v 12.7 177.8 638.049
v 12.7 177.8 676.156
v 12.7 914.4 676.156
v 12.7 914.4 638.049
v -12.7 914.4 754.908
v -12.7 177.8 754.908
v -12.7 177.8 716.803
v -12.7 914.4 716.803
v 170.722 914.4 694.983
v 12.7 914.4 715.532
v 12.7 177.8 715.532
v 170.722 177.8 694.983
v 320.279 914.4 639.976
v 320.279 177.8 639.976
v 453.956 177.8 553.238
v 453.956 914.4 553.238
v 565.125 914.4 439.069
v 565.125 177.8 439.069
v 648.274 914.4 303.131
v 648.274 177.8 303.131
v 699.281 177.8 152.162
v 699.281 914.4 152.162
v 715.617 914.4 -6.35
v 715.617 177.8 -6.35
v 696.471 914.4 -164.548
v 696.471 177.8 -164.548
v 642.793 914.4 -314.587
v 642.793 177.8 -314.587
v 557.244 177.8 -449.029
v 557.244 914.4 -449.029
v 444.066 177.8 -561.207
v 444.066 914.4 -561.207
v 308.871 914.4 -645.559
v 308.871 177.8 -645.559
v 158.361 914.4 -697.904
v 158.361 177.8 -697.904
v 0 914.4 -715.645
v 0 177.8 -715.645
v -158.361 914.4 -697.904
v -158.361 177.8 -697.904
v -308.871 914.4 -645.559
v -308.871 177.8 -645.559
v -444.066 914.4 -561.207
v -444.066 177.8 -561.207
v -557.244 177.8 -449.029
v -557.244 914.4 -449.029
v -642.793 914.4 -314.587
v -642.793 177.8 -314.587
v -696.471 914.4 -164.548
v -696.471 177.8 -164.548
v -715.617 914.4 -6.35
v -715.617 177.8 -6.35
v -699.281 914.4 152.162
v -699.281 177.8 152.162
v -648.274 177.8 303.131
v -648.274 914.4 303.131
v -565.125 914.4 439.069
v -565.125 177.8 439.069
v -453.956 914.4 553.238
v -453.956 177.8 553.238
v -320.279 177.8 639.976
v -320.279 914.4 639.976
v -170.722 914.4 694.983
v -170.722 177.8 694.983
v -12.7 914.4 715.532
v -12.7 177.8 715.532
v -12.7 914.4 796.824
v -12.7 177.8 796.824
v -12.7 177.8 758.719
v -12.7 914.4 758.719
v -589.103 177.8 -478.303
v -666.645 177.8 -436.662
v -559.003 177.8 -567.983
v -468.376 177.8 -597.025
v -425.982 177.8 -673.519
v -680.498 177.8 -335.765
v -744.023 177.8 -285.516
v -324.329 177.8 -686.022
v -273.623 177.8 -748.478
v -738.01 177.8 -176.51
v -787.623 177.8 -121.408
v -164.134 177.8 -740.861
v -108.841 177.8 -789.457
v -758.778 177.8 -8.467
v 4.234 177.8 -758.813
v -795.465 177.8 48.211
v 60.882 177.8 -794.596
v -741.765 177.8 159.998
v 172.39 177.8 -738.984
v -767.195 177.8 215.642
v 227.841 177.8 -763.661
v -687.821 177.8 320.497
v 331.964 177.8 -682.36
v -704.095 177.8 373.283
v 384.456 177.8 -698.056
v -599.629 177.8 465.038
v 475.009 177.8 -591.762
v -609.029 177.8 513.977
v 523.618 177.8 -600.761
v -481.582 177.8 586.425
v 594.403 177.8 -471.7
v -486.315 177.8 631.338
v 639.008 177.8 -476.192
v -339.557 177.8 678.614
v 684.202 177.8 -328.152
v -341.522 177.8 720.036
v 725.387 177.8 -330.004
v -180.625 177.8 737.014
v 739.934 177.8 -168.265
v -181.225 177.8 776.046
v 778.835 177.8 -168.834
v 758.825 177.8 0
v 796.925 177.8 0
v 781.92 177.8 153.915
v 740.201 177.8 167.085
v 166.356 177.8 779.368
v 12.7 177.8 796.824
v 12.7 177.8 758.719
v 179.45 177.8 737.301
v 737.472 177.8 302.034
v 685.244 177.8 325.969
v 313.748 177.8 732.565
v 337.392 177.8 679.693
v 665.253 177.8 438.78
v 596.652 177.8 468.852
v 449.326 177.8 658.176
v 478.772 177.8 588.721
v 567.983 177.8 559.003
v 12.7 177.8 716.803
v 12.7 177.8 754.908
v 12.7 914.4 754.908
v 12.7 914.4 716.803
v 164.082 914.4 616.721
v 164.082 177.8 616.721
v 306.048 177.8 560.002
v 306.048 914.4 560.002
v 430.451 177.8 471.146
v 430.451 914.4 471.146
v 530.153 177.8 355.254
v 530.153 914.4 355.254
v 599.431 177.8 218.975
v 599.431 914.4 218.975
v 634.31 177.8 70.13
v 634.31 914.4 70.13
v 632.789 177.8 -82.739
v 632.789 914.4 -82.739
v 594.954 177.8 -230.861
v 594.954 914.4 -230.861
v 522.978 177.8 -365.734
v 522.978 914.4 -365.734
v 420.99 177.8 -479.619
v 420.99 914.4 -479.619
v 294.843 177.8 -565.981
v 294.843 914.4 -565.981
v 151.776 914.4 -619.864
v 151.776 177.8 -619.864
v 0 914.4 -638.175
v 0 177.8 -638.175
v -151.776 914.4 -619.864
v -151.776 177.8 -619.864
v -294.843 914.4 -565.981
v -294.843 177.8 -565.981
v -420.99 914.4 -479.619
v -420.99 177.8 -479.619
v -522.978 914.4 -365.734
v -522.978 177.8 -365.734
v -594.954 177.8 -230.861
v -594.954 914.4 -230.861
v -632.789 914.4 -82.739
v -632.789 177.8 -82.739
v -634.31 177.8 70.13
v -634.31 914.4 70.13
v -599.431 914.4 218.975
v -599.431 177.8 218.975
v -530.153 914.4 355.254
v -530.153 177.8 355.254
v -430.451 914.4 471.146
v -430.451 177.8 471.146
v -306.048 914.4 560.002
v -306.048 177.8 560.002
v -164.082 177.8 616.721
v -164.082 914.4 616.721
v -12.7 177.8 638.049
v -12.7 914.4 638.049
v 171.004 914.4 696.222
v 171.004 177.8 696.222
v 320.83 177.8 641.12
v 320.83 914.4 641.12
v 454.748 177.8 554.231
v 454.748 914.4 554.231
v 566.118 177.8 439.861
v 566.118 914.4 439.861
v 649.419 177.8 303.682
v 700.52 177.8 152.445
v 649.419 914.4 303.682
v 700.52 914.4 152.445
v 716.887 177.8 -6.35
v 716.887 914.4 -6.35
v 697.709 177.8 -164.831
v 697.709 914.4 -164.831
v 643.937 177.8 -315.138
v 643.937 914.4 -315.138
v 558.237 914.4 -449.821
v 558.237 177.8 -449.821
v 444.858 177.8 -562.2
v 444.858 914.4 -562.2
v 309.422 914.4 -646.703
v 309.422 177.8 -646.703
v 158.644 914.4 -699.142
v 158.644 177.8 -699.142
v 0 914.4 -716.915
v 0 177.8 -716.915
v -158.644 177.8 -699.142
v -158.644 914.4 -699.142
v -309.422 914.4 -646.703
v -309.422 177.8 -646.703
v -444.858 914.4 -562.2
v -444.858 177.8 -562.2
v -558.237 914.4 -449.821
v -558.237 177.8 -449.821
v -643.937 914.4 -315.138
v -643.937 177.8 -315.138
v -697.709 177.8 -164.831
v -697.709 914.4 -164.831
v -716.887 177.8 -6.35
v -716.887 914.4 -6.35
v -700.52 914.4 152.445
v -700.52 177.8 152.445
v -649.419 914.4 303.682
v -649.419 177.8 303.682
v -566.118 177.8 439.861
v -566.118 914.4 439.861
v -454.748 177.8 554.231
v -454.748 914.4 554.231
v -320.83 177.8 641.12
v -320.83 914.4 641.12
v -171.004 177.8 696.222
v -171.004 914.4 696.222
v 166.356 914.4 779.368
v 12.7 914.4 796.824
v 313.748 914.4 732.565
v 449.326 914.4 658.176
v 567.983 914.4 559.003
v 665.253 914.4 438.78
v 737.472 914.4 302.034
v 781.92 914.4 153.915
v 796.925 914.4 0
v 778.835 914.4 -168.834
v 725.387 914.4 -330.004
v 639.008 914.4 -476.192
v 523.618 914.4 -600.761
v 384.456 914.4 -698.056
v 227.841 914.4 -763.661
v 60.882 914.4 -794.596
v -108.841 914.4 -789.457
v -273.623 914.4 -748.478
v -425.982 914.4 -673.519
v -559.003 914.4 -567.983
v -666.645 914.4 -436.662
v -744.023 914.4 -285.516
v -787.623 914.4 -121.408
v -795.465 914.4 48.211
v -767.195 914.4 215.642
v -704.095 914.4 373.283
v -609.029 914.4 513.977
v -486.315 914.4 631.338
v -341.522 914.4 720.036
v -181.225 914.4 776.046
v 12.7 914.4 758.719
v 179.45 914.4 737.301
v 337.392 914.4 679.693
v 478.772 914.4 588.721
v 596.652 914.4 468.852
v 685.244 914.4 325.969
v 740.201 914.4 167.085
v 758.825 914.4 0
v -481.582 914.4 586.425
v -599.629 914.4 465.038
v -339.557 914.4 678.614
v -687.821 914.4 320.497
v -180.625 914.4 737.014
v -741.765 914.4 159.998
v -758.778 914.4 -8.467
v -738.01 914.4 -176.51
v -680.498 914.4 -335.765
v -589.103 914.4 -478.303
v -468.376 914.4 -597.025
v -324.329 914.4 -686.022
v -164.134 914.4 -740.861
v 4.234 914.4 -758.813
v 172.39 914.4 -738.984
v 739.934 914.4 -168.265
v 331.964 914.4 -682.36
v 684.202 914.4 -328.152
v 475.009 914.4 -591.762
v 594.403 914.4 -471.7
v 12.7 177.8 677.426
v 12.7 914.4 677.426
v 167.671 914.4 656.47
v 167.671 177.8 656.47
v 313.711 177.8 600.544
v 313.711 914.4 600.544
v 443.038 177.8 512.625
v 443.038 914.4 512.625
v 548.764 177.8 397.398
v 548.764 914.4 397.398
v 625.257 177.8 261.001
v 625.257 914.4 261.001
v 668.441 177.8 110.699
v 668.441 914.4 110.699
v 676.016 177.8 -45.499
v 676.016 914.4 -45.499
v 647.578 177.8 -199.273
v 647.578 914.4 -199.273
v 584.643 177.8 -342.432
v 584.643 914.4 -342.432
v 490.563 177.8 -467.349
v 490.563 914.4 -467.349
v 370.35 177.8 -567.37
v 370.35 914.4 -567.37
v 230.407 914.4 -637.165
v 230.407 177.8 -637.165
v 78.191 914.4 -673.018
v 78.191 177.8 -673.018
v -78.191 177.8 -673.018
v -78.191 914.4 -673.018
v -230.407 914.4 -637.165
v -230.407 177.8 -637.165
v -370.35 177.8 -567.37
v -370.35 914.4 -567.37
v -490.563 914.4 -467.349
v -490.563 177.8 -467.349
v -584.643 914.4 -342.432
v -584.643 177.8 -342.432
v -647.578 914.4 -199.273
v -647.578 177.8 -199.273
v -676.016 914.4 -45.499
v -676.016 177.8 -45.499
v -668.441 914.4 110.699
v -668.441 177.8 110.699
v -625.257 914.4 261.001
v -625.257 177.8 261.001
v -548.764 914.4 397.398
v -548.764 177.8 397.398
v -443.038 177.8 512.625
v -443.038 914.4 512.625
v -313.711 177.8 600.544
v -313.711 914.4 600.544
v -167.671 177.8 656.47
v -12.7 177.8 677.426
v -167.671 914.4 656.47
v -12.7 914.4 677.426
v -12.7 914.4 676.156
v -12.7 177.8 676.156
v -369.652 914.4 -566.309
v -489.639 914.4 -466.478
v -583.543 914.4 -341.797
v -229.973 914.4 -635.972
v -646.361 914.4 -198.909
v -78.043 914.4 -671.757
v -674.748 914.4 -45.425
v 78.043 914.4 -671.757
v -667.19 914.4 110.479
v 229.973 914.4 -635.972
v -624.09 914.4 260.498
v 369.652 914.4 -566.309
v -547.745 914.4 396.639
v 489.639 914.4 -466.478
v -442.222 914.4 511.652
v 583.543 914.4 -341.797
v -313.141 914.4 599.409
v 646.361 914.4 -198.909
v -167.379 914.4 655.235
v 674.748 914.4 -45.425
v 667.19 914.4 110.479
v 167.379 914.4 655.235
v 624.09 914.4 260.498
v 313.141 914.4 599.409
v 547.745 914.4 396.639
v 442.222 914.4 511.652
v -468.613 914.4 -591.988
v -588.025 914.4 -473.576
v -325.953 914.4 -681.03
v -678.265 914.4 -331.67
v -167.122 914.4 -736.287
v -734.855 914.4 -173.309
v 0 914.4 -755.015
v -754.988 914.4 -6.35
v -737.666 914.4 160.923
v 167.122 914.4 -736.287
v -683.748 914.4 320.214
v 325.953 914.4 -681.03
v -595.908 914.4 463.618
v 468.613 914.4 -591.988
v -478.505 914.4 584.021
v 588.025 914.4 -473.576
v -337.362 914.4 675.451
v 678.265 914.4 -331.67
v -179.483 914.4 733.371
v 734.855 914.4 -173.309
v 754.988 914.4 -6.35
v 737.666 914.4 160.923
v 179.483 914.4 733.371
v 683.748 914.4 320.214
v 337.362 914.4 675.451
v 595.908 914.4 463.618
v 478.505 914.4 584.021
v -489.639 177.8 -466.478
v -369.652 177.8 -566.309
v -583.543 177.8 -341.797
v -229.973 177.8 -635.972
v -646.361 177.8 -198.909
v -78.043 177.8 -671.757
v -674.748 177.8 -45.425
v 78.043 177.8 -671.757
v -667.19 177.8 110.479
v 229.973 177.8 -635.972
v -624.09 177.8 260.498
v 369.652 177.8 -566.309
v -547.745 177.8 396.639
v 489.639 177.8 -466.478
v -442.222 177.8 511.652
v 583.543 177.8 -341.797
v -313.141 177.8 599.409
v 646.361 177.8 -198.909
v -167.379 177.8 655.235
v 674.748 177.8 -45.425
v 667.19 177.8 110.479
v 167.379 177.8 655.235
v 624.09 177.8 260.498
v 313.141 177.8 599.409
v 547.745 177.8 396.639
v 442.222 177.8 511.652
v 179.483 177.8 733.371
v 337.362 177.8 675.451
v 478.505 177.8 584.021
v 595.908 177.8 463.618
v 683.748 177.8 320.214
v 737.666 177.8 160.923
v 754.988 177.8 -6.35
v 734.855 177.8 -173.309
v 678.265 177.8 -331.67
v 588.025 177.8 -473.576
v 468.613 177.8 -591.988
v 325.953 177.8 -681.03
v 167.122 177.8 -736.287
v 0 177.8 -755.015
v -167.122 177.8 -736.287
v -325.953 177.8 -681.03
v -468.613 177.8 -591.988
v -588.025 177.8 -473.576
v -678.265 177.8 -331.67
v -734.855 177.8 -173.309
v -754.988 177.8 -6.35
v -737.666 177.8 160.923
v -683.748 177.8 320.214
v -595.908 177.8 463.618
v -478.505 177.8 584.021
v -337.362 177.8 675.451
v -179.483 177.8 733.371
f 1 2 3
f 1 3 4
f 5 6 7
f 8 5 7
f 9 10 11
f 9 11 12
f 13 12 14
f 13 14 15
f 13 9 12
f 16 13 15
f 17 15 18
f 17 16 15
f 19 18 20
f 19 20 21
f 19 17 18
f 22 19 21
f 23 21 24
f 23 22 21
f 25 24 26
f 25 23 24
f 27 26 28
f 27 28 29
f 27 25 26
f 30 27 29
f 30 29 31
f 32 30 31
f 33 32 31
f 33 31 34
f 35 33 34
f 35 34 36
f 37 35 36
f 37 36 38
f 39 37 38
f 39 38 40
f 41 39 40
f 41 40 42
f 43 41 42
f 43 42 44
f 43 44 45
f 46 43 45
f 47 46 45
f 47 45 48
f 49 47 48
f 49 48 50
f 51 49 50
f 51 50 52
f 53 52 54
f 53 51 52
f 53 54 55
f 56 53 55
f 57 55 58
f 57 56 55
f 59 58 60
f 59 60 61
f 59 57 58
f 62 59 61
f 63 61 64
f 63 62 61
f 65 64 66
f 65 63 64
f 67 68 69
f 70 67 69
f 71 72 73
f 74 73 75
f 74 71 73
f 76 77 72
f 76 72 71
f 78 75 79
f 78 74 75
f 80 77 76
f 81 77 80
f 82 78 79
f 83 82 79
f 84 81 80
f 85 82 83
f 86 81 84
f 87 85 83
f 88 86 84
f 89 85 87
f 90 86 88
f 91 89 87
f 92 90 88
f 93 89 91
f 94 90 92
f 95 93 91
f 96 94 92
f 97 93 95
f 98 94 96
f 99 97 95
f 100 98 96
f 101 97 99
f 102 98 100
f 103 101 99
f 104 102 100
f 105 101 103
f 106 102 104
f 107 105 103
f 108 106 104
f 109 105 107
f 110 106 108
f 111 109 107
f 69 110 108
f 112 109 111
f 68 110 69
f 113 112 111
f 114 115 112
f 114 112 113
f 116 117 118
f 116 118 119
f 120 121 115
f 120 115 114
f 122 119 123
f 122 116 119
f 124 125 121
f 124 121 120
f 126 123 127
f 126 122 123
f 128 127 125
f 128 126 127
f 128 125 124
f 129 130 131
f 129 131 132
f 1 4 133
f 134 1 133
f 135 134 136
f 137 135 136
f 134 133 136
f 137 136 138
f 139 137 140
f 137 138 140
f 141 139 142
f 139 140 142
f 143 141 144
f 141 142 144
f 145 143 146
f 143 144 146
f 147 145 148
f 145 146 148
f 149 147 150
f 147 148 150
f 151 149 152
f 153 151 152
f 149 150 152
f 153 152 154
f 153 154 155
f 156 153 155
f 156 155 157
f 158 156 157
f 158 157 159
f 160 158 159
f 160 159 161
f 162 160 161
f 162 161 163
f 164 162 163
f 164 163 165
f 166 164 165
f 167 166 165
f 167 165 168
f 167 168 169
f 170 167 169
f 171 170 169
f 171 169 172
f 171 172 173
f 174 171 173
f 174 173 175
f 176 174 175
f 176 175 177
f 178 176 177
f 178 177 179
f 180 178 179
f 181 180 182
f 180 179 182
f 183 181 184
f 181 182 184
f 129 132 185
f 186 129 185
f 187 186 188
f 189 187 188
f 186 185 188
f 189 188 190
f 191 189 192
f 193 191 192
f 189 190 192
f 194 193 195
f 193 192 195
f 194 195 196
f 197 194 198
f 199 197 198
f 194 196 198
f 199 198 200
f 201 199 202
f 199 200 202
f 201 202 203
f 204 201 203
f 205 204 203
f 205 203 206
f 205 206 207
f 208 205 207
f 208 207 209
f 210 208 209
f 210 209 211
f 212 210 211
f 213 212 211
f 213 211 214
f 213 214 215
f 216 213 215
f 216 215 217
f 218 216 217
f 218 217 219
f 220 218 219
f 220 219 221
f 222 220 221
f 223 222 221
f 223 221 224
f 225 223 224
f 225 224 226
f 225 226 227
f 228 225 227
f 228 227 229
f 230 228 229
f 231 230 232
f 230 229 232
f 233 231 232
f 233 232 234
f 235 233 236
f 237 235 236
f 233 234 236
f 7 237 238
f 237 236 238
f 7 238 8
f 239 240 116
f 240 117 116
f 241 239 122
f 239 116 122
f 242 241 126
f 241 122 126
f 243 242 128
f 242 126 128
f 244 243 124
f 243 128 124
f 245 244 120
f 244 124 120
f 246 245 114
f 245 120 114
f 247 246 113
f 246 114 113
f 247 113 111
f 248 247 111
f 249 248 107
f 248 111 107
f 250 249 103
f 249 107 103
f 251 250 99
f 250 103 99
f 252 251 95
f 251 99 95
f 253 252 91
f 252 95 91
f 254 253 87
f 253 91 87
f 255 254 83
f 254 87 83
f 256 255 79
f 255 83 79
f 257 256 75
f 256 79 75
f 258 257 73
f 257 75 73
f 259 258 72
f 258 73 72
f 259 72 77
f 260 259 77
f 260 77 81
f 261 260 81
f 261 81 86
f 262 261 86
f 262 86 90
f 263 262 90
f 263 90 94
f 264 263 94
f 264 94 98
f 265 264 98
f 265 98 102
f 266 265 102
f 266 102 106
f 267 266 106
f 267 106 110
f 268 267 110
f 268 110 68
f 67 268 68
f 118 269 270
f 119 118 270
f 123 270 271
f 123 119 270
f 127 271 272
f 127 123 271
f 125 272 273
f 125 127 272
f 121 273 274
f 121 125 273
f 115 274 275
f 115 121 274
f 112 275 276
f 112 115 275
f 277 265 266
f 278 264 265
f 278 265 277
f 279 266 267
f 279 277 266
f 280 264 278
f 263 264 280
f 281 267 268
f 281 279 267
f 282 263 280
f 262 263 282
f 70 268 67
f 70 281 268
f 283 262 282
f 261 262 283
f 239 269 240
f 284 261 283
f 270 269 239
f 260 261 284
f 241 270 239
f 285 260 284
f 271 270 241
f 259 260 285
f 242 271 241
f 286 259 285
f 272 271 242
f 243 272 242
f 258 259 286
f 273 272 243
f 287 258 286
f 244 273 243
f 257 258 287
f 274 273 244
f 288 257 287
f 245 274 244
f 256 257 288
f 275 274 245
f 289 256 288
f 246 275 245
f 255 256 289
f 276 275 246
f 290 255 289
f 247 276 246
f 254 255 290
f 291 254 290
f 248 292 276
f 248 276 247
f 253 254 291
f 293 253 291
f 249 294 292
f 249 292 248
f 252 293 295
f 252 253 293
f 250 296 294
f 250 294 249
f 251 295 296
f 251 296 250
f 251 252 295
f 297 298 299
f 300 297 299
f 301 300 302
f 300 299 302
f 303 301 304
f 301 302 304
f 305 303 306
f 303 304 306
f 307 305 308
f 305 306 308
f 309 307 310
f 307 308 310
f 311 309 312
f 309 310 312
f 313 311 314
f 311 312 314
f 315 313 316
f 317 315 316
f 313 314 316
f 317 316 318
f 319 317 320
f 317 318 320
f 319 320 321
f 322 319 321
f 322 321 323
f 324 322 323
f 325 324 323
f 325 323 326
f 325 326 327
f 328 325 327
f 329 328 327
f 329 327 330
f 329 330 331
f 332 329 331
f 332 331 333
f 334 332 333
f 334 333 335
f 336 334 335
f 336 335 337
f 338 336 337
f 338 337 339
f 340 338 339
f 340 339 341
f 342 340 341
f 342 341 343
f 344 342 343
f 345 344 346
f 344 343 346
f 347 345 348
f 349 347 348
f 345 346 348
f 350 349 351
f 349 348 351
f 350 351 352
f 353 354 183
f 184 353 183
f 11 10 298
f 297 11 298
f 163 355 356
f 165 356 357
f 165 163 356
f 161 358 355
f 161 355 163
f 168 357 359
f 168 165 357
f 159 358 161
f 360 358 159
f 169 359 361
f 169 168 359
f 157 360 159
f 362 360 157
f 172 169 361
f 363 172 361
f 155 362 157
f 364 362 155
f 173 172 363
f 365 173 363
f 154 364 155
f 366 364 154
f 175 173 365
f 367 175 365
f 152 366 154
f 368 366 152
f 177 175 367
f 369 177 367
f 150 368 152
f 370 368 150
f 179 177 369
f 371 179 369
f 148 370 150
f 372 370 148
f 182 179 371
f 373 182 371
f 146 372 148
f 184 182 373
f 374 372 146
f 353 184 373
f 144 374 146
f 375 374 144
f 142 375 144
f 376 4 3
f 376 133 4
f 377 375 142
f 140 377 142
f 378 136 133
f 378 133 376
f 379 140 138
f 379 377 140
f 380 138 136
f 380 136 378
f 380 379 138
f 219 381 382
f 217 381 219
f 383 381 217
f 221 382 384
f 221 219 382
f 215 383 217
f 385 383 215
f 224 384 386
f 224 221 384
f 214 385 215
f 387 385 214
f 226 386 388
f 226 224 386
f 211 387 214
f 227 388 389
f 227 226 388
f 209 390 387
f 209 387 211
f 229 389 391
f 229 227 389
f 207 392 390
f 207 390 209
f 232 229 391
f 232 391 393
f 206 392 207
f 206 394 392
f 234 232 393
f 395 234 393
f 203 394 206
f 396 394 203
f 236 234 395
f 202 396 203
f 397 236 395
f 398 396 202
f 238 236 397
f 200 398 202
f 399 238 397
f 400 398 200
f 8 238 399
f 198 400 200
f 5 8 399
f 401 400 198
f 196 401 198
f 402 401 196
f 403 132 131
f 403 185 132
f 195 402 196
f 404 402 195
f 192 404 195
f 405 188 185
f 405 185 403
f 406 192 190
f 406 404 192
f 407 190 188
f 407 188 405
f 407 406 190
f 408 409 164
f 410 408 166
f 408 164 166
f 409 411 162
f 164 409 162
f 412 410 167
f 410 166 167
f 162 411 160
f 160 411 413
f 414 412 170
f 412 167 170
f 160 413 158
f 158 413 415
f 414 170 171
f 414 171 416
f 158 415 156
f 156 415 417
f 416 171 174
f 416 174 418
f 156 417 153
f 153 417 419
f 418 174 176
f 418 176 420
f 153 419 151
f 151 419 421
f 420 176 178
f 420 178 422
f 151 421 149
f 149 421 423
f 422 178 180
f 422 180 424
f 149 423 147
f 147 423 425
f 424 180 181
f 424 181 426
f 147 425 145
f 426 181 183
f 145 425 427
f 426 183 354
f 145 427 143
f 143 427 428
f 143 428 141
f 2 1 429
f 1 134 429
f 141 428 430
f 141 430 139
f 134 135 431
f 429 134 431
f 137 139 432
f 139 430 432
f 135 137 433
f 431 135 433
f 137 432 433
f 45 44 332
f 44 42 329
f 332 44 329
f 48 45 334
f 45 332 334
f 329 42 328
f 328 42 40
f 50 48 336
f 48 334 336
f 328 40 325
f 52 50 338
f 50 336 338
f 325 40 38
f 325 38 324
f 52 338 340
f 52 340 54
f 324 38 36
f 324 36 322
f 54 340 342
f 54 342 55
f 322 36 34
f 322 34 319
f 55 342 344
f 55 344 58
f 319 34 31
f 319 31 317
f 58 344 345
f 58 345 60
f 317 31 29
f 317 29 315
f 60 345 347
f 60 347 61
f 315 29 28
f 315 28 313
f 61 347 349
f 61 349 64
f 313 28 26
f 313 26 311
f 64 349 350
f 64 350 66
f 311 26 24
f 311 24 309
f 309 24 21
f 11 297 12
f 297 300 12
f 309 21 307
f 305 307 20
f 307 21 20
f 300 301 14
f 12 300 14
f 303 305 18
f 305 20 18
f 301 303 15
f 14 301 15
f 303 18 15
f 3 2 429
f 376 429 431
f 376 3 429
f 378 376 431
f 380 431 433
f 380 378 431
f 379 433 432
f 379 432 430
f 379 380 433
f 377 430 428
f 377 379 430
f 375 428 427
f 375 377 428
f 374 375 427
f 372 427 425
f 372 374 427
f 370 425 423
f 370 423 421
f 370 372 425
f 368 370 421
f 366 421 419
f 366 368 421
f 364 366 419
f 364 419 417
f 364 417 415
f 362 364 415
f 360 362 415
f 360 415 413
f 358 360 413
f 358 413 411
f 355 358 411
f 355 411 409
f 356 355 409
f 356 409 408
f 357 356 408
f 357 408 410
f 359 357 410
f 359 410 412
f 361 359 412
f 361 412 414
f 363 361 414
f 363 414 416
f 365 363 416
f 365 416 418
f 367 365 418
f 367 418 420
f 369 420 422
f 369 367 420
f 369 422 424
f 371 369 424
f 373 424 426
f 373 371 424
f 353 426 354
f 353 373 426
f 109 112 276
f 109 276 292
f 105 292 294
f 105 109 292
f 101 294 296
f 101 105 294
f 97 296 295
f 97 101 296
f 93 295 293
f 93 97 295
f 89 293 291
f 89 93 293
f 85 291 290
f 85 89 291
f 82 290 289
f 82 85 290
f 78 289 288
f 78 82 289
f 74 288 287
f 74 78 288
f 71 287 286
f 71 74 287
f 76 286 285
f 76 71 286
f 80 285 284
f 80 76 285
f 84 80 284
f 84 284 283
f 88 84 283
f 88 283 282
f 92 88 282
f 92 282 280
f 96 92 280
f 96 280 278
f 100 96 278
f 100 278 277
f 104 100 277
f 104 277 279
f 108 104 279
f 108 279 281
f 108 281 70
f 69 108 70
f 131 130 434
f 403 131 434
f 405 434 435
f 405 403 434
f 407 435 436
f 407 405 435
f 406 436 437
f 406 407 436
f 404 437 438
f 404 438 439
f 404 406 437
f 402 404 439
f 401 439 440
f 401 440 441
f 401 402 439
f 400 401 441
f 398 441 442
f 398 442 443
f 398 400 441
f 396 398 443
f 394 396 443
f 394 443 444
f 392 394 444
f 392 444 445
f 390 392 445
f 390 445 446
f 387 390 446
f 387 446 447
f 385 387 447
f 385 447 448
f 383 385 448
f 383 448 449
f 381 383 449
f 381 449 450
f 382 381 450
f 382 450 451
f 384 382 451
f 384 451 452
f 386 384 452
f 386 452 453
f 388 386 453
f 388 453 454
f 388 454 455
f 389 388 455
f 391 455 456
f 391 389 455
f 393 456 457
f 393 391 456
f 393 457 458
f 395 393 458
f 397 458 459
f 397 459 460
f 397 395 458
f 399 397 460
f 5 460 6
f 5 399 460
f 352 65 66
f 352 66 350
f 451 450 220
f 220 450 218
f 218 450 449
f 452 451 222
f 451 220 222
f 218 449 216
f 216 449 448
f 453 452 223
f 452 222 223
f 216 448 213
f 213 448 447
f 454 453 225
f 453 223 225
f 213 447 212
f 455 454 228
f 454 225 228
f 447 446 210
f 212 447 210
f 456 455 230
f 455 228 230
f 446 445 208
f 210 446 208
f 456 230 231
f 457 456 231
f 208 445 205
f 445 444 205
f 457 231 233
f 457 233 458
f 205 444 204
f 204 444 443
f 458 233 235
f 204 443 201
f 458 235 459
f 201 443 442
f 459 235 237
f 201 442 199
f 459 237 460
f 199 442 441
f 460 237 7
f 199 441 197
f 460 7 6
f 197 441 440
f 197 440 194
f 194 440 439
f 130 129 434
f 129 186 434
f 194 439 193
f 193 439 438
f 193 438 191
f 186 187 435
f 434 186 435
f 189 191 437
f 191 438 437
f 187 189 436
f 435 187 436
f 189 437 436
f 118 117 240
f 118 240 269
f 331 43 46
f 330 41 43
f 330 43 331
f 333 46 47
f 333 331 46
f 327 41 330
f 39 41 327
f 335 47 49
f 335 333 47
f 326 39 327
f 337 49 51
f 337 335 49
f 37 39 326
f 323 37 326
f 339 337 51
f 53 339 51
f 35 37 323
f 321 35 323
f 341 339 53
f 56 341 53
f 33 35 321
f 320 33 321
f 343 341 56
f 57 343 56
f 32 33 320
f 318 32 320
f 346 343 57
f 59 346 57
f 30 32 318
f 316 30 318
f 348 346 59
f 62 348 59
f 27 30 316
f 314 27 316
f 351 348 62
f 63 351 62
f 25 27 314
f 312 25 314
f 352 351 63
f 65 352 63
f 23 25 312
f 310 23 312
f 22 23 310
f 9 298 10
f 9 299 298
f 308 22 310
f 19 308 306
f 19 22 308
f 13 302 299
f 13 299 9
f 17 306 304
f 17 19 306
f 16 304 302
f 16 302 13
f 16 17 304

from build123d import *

# Parameters (mm, degrees)
BOSS_EXTRUDE1_OUTLINE_R   = 796.925
BOSS_EXTRUDE1_OUTLINE_R_2 = 758.825
BOSS_EXTRUDE1_DEPTH       = 914.4
SKETCH3_R                 = 676.275
SKETCH3_R_2               = 638.175
BOSS_EXTRUDE2_DEPTH       = 736.6
SKETCH3_R_3               = 715.645
SKETCH3_R_4               = 677.545
BOSS_EXTRUDE2_2_DEPTH     = 736.6
SKETCH3_R_5               = 755.015
SKETCH3_R_6               = 716.915
BOSS_EXTRUDE2_3_DEPTH     = 736.6
SKETCH2_W                 = 25.4
SKETCH2_H                 = 508
CUT_EXTRUDE2_DEPTH        = 1452.311913839
CUT_EXTRUDE3_DEPTH        = 177.8


# Read off the part's stored shape, not the designer's step: Boss-Extrude1
with BuildPart() as part:
    # Boss-Extrude1 outline → Boss-Extrude1 (new body)
    with BuildSketch(Plane(origin=(0, 0, 0), x_dir=(1, 0, 0), z_dir=(0, 1, 0))):
        Circle(BOSS_EXTRUDE1_OUTLINE_R)
        Circle(BOSS_EXTRUDE1_OUTLINE_R_2, mode=Mode.SUBTRACT)
    extrude(amount=BOSS_EXTRUDE1_DEPTH)


with BuildPart() as body_2:
    # Sketch3 → Boss-Extrude2 (new body)
    with BuildSketch(Plane(origin=(0, 914.4, 0), x_dir=(1, 0, 0), z_dir=(0, 1, 0))):
        with Locations(Location((0, 0, 0), (0, 0, 270))):
            Circle(SKETCH3_R)
        with Locations(Location((0, 0, 0), (0, 0, 270))):
            Circle(SKETCH3_R_2, mode=Mode.SUBTRACT)
    extrude(amount=-BOSS_EXTRUDE2_DEPTH)


with BuildPart() as body_3:
    # Sketch3 → Boss-Extrude2 2 (new body)
    with BuildSketch(Plane(origin=(0, 914.4, 0), x_dir=(1, 0, 0), z_dir=(0, 1, 0))):
        with Locations(Location((0, 0, 0), (0, 0, 270))):
            Circle(SKETCH3_R_3)
        with Locations(Location((0, 0, 0), (0, 0, 270))):
            Circle(SKETCH3_R_4, mode=Mode.SUBTRACT)
    extrude(amount=-BOSS_EXTRUDE2_2_DEPTH)


with BuildPart() as body_4:
    # Sketch3 → Boss-Extrude2 3 (new body)
    with BuildSketch(Plane(origin=(0, 914.4, 0), x_dir=(1, 0, 0), z_dir=(0, 1, 0))):
        with Locations(Location((0, 0, 0), (0, 0, 270))):
            Circle(SKETCH3_R_5)
        with Locations(Location((0, 0, 0), (0, 0, 270))):
            Circle(SKETCH3_R_6, mode=Mode.SUBTRACT)
    extrude(amount=-BOSS_EXTRUDE2_3_DEPTH)


with BuildPart() as cut_extrude2_tool:
    # Sketch2 → Cut-Extrude2 (new, through all)
    with BuildSketch(Plane(origin=(0, 0, 0), x_dir=(1, 0, 0), z_dir=(0, 1, 0))):
        with Locations((0, -796.925)):
            Rectangle(SKETCH2_W, SKETCH2_H)
    extrude(amount=CUT_EXTRUDE2_DEPTH)


with BuildPart() as part_1:
    add(part.part)

    # Cut-Extrude2: cut by cut_extrude2_tool
    add(cut_extrude2_tool.part, mode=Mode.SUBTRACT)

    # Sketch4 → Cut-Extrude3 (cut)
    with BuildSketch(Plane.XZ):
        with BuildLine():
            Line((12.7, 796.823798355), (12.7, 758.718716406))
            ThreePointArc((12.7, 758.718716406), (0, -758.825), (-12.7, 758.718716406))
            Line((-12.7, 758.718716406), (-12.7, 796.823798355))
            ThreePointArc((-12.7, 796.823798355), (0, -796.925), (12.7, 796.823798355))
        make_face()
    extrude(amount=-CUT_EXTRUDE3_DEPTH, mode=Mode.SUBTRACT)


with BuildPart() as body_2_1:
    add(body_2.part)

    # Cut-Extrude2: cut by cut_extrude2_tool
    add(cut_extrude2_tool.part, mode=Mode.SUBTRACT)


with BuildPart() as body_3_1:
    add(body_3.part)

    # Cut-Extrude2: cut by cut_extrude2_tool
    add(cut_extrude2_tool.part, mode=Mode.SUBTRACT)


with BuildPart() as body_4_1:
    add(body_4.part)

    # Cut-Extrude2: cut by cut_extrude2_tool
    add(cut_extrude2_tool.part, mode=Mode.SUBTRACT)


solid = Compound([part_1.part, body_2_1.part, body_3_1.part, body_4_1.part])
